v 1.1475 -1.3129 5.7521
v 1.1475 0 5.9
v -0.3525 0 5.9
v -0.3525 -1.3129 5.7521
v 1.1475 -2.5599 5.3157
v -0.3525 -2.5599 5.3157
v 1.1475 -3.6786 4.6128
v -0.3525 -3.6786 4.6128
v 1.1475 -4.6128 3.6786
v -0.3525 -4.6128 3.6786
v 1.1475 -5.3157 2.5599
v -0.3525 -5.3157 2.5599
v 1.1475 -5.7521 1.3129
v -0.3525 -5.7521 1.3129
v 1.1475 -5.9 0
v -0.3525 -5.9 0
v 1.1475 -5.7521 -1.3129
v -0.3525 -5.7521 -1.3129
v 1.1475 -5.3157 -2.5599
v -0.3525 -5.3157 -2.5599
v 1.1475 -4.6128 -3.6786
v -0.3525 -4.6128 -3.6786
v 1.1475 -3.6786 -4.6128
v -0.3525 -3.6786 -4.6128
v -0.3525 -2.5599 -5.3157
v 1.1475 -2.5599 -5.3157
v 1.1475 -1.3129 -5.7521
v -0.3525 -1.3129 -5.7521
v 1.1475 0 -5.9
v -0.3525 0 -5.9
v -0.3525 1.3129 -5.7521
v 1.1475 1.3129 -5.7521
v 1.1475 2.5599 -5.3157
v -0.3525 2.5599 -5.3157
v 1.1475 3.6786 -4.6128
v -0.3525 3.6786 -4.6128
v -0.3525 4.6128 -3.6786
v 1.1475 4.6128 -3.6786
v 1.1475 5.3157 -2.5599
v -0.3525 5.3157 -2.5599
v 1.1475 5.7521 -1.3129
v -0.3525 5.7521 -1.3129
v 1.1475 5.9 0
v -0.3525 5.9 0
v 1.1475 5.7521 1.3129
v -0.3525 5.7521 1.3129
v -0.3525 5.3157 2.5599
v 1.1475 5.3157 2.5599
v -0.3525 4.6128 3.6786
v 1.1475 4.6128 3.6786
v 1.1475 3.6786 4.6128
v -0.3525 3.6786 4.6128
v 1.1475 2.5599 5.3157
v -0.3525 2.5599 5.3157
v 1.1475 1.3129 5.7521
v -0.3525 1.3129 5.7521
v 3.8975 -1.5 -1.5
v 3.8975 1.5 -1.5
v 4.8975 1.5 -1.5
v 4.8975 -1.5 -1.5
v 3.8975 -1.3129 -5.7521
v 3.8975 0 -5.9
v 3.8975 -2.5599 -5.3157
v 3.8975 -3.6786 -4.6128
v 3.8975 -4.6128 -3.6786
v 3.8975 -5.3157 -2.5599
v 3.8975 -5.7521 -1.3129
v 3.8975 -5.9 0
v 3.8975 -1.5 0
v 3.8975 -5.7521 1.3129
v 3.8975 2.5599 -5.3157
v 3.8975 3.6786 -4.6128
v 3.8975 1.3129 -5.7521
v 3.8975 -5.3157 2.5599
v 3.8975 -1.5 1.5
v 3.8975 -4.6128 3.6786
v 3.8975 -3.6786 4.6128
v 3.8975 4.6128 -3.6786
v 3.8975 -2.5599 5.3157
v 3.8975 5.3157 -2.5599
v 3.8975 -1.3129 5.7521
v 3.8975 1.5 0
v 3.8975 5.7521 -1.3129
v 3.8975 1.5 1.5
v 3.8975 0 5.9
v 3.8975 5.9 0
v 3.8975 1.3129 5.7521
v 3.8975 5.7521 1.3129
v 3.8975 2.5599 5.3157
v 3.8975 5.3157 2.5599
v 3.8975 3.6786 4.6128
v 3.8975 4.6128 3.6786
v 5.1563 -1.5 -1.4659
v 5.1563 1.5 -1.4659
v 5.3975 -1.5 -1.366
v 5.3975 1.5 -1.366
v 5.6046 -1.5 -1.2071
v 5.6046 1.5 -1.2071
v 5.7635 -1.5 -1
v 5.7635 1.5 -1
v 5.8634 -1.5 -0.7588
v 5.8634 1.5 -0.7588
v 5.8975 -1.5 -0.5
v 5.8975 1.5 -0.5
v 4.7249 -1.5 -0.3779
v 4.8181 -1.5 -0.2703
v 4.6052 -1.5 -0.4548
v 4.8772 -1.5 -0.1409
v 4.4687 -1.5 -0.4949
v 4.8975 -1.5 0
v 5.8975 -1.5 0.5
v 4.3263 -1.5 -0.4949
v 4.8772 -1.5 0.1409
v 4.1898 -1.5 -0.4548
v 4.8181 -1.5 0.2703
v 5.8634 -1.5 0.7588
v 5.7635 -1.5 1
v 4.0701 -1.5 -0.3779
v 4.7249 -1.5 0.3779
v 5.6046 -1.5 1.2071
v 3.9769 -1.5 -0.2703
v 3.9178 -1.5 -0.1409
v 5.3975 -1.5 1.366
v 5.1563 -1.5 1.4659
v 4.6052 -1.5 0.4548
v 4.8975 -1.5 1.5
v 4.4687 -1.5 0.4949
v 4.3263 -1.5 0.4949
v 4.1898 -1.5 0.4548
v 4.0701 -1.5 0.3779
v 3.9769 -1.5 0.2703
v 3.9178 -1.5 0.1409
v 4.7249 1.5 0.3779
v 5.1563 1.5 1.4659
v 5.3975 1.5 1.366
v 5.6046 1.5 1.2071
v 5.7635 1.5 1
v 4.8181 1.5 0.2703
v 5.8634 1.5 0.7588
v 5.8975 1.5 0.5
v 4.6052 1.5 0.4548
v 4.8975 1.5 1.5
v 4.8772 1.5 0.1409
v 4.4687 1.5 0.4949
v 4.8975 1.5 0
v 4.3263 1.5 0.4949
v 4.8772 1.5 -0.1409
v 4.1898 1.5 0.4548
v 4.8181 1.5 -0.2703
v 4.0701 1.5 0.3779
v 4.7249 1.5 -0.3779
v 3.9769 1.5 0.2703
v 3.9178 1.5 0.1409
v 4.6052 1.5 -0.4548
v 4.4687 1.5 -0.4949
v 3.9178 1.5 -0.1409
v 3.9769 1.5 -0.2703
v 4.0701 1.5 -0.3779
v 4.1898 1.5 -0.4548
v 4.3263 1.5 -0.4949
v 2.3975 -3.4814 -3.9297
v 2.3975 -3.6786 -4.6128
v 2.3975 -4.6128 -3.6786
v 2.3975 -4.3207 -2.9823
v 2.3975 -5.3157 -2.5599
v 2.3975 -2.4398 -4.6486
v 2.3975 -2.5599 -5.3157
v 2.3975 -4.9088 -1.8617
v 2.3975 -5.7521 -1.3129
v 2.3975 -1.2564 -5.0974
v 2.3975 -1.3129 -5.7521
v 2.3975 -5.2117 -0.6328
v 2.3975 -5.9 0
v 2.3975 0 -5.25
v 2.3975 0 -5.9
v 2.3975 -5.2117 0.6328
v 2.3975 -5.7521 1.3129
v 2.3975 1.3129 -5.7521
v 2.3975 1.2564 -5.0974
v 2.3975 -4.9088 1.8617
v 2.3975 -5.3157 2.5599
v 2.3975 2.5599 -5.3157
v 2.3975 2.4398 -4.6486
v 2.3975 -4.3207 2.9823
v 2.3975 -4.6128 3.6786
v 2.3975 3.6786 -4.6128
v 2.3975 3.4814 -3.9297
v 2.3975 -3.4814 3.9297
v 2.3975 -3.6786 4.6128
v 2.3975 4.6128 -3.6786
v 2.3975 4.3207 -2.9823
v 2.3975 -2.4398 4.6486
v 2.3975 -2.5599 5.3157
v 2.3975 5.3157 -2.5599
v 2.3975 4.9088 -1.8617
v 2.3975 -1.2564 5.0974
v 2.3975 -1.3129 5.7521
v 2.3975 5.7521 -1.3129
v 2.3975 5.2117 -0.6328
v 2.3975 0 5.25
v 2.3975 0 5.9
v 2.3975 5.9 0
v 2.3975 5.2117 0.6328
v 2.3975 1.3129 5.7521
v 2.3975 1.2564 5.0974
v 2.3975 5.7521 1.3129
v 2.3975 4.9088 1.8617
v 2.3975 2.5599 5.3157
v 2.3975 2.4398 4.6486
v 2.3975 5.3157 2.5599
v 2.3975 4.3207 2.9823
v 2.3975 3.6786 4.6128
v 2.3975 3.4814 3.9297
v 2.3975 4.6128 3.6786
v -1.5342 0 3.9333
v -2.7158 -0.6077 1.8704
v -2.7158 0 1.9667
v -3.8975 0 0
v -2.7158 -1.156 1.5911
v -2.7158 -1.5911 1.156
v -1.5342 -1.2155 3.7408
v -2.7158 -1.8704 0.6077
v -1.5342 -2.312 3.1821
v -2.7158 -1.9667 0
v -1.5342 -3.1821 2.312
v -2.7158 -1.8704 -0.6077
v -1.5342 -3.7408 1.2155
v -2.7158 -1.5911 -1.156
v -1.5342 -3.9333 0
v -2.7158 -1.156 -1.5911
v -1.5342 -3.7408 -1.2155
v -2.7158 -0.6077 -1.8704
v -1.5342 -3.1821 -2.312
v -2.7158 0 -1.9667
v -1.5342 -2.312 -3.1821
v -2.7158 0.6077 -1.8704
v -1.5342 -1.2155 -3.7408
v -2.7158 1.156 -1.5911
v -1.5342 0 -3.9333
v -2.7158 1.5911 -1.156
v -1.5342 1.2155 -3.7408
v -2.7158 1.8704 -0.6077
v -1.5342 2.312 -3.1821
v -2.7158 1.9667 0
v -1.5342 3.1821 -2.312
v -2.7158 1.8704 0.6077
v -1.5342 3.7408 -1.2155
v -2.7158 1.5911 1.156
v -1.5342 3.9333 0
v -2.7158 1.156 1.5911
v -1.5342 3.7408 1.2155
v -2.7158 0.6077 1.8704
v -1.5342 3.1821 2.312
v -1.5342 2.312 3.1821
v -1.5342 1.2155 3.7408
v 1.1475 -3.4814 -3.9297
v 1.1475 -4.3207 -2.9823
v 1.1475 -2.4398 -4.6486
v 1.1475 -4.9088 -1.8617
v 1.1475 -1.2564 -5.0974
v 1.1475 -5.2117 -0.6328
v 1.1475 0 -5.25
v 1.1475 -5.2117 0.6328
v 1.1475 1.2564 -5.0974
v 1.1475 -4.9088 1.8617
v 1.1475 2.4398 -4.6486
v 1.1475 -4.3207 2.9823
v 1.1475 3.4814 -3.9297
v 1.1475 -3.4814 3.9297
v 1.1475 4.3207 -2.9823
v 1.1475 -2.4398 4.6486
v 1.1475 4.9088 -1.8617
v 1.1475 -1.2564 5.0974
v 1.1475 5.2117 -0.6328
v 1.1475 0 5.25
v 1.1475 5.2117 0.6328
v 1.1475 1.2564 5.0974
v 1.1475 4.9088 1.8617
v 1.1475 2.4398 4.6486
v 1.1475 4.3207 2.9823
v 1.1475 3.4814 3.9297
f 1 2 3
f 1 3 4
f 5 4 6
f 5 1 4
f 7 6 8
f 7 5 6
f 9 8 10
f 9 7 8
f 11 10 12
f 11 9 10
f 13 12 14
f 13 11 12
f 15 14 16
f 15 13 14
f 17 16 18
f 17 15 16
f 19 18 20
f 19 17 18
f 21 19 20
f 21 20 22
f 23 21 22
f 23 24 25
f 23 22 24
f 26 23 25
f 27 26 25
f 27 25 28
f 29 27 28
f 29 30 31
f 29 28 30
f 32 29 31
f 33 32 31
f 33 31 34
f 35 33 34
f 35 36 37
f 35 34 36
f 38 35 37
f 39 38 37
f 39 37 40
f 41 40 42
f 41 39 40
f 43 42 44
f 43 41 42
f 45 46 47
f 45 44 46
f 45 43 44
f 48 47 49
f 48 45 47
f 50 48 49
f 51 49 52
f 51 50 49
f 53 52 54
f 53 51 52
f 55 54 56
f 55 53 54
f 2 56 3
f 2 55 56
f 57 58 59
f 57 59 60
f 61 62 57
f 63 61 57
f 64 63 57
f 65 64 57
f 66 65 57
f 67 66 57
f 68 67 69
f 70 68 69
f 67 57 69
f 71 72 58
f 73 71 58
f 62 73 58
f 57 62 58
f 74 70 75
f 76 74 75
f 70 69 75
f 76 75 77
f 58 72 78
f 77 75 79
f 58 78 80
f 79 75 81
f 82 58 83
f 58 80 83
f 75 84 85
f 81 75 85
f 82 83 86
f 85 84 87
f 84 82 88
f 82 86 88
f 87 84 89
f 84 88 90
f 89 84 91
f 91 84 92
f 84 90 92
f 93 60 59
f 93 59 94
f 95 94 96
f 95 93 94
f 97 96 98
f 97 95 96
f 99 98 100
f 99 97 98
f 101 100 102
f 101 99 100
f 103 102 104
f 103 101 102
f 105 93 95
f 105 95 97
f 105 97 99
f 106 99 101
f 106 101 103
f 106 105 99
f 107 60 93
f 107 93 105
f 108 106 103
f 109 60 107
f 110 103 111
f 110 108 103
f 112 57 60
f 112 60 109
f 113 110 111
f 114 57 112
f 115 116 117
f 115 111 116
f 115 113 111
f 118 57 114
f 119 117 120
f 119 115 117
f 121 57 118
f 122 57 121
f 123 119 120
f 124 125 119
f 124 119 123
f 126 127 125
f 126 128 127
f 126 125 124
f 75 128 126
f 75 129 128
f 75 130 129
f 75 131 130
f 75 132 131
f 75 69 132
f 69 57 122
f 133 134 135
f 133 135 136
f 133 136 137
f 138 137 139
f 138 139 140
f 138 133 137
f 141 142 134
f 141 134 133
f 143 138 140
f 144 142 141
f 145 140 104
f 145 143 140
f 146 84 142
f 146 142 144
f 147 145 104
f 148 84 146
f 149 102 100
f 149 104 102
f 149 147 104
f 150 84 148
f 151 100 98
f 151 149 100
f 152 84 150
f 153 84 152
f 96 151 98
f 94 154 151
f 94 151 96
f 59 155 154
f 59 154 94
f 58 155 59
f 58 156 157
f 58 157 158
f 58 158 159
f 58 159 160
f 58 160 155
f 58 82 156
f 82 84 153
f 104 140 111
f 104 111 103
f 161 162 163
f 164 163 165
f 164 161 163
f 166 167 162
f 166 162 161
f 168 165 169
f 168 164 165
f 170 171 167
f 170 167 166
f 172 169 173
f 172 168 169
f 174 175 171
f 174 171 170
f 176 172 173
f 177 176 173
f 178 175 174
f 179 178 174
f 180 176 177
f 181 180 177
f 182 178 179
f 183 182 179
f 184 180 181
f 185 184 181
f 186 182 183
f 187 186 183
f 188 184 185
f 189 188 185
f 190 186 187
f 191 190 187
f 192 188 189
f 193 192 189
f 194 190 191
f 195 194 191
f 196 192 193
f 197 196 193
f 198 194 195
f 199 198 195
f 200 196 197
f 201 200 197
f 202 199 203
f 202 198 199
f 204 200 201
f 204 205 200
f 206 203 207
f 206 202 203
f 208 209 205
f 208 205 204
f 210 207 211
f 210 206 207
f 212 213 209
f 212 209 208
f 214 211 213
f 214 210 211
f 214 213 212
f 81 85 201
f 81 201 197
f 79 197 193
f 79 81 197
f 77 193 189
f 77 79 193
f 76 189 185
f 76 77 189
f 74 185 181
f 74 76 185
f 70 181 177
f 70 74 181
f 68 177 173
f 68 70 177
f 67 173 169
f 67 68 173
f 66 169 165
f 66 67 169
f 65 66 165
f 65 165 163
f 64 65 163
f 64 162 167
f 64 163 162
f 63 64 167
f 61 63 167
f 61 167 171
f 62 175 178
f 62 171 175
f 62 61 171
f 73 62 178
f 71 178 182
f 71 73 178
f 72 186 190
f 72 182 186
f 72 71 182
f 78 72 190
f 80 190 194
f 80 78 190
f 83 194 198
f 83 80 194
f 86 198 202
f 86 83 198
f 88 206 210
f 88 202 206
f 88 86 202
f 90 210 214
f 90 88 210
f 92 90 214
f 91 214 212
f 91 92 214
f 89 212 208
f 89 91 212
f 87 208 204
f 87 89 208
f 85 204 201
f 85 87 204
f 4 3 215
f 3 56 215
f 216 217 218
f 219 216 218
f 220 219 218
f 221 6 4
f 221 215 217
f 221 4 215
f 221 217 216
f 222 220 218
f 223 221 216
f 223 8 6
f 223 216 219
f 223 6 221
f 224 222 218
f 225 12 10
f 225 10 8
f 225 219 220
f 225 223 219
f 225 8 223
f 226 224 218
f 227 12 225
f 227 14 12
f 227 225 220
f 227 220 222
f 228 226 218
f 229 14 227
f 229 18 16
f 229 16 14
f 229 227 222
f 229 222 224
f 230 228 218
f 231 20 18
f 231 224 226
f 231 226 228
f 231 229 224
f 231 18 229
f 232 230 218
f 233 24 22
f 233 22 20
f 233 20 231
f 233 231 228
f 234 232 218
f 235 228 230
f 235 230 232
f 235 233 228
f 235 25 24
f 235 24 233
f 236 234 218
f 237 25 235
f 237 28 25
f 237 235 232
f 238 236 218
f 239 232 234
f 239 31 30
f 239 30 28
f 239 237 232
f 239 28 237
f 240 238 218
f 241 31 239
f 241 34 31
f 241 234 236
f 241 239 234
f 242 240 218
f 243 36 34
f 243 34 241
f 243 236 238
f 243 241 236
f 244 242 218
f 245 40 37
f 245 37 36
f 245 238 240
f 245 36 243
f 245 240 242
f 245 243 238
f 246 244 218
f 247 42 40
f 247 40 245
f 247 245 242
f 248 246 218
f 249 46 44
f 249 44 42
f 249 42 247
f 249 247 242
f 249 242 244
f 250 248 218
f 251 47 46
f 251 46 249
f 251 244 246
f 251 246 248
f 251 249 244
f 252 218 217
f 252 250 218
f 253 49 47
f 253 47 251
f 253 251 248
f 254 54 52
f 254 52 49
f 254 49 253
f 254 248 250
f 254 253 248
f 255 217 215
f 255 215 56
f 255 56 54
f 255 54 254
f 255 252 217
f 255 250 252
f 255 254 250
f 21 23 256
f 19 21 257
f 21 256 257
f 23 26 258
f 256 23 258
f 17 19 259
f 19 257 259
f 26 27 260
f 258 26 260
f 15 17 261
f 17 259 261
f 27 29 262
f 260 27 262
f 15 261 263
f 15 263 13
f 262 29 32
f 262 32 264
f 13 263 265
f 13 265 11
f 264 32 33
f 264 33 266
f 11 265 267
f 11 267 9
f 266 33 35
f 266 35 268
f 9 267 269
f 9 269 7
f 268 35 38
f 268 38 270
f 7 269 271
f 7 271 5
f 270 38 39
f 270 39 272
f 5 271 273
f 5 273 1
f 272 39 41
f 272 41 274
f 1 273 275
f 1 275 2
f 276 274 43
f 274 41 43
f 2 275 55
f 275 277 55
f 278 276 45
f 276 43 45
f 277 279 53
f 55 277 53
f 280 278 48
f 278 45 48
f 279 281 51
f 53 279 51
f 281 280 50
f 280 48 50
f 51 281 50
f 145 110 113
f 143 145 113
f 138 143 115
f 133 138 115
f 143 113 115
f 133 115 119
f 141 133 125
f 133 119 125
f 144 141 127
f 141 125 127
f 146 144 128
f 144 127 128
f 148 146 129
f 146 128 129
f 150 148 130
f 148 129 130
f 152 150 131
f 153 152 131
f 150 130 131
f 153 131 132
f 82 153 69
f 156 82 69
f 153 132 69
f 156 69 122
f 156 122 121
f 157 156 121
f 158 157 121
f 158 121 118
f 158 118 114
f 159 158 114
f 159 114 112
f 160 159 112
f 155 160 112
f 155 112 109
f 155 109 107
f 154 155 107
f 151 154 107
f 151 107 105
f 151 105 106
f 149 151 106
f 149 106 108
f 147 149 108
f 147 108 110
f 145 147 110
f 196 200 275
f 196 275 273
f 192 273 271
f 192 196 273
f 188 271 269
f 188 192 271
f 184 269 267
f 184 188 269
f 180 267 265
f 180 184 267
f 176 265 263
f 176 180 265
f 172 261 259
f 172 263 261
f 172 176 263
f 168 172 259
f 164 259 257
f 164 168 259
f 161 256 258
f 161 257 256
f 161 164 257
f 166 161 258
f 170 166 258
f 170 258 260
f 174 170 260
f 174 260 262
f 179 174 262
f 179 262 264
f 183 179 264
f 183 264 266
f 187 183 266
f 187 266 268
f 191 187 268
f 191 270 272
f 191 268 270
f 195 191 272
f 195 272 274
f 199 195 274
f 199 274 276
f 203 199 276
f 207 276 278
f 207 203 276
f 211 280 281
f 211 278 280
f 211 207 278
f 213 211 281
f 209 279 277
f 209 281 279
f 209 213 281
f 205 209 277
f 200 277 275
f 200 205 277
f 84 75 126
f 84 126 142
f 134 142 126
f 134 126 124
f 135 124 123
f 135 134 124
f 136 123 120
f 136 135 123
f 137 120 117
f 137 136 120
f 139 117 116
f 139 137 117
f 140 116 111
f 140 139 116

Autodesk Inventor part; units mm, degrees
ref_plane "YZ Plane" through (0, 0, 0) normal (1, 0, 0) x (0, 1, 0)
ref_plane "XZ Plane" through (0, 0, 0) normal (0, 1, 0) x (-1, 0, 0)
ref_plane "XY Plane" through (0, 0, 0) normal (0, 0, 1) x (1, 0, 0)
sketch "Sketch1" plane through (0, 0, 0) normal (0, 1, 0) x (-1, 0, 0)
  line L0 (3.8975, 0) -> (0.3525, 5.9)
  line L1 (0.3525, 5.9) -> (-1.1475, 5.9)
  line L2 (-1.1475, 5.9) -> (-1.1475, 5.25)
  line L3 (-1.1475, 5.25) -> (-2.3975, 5.25)
  line L4 (-2.3975, 5.25) -> (-2.3975, 5.9)
  line L5 (-2.3975, 5.9) -> (-3.8975, 5.9)
  line L6 (-3.8975, 5.9) -> (-3.8975, 0)
  line L7 (-3.8975, 0) -> (3.8975, 0)
  point P0 (0, 0)
  point P1 (0, 0)
  dimension "d0" = 11.8
  dimension "d1" = 1.25
  dimension "d2" = 10.5
  dimension "d3" = 59
  dimension "d4" = 1.5
revolve "Revolution1" add sketch "Sketch1" angle 360 about axis through (3.8975, 0, 0) along (-1, 0, 0)
sketch "Sketch2" plane through (3.8975, 0, 0) normal (1, 0, 0) x (0, 0, -1)
  line L0 (1.5, -1.5) -> (-1.5, -1.5)
  line L1 (-1.5, -1.5) -> (-1.5, 1.5)
  line L2 (-1.5, 1.5) -> (1.5, 1.5)
  line L3 (1.5, 1.5) -> (1.5, -1.5)
  line L4 (1.5, -1.5) -> (-1.5, 1.5) construction
  line L5 (-1.5, -1.5) -> (1.5, 1.5) construction
  point P0 (0, 0)
  dimension "d6" = 3
  dimension "d7" = 3
extrude "Extrusion1" add sketch "Sketch2" along normal blind 2
sketch "Sketch3" plane through (3.8975, -1.5, -1.5) normal (0, -1, 0) x (1, 0, 0)
  line L0 (0, 0) -> (0, 3) projected
  line L1 (0, 0) -> (2, 0) projected
  line L2 (2, 3) -> (2, 0) projected
  line L3 (0, 3) -> (2, 3) projected
  circle A0 centre (0.5, 1.5) radius 0.5
  line L4 (0, 7.4) -> (0, -4.4) projected
  point P0 (-3.8975, 1.5)
  dimension "d10" = 1
extrude "Extrusion2" cut sketch "Sketch3" against normal through all contours A0
fillet "Fillet1" radius 1 2 edges at (5.8975, 0, 1.5) (5.8975, 0, -1.5)
properties part number "PayloadGermination_SyringePlunger" material "Aluminum 6061"
